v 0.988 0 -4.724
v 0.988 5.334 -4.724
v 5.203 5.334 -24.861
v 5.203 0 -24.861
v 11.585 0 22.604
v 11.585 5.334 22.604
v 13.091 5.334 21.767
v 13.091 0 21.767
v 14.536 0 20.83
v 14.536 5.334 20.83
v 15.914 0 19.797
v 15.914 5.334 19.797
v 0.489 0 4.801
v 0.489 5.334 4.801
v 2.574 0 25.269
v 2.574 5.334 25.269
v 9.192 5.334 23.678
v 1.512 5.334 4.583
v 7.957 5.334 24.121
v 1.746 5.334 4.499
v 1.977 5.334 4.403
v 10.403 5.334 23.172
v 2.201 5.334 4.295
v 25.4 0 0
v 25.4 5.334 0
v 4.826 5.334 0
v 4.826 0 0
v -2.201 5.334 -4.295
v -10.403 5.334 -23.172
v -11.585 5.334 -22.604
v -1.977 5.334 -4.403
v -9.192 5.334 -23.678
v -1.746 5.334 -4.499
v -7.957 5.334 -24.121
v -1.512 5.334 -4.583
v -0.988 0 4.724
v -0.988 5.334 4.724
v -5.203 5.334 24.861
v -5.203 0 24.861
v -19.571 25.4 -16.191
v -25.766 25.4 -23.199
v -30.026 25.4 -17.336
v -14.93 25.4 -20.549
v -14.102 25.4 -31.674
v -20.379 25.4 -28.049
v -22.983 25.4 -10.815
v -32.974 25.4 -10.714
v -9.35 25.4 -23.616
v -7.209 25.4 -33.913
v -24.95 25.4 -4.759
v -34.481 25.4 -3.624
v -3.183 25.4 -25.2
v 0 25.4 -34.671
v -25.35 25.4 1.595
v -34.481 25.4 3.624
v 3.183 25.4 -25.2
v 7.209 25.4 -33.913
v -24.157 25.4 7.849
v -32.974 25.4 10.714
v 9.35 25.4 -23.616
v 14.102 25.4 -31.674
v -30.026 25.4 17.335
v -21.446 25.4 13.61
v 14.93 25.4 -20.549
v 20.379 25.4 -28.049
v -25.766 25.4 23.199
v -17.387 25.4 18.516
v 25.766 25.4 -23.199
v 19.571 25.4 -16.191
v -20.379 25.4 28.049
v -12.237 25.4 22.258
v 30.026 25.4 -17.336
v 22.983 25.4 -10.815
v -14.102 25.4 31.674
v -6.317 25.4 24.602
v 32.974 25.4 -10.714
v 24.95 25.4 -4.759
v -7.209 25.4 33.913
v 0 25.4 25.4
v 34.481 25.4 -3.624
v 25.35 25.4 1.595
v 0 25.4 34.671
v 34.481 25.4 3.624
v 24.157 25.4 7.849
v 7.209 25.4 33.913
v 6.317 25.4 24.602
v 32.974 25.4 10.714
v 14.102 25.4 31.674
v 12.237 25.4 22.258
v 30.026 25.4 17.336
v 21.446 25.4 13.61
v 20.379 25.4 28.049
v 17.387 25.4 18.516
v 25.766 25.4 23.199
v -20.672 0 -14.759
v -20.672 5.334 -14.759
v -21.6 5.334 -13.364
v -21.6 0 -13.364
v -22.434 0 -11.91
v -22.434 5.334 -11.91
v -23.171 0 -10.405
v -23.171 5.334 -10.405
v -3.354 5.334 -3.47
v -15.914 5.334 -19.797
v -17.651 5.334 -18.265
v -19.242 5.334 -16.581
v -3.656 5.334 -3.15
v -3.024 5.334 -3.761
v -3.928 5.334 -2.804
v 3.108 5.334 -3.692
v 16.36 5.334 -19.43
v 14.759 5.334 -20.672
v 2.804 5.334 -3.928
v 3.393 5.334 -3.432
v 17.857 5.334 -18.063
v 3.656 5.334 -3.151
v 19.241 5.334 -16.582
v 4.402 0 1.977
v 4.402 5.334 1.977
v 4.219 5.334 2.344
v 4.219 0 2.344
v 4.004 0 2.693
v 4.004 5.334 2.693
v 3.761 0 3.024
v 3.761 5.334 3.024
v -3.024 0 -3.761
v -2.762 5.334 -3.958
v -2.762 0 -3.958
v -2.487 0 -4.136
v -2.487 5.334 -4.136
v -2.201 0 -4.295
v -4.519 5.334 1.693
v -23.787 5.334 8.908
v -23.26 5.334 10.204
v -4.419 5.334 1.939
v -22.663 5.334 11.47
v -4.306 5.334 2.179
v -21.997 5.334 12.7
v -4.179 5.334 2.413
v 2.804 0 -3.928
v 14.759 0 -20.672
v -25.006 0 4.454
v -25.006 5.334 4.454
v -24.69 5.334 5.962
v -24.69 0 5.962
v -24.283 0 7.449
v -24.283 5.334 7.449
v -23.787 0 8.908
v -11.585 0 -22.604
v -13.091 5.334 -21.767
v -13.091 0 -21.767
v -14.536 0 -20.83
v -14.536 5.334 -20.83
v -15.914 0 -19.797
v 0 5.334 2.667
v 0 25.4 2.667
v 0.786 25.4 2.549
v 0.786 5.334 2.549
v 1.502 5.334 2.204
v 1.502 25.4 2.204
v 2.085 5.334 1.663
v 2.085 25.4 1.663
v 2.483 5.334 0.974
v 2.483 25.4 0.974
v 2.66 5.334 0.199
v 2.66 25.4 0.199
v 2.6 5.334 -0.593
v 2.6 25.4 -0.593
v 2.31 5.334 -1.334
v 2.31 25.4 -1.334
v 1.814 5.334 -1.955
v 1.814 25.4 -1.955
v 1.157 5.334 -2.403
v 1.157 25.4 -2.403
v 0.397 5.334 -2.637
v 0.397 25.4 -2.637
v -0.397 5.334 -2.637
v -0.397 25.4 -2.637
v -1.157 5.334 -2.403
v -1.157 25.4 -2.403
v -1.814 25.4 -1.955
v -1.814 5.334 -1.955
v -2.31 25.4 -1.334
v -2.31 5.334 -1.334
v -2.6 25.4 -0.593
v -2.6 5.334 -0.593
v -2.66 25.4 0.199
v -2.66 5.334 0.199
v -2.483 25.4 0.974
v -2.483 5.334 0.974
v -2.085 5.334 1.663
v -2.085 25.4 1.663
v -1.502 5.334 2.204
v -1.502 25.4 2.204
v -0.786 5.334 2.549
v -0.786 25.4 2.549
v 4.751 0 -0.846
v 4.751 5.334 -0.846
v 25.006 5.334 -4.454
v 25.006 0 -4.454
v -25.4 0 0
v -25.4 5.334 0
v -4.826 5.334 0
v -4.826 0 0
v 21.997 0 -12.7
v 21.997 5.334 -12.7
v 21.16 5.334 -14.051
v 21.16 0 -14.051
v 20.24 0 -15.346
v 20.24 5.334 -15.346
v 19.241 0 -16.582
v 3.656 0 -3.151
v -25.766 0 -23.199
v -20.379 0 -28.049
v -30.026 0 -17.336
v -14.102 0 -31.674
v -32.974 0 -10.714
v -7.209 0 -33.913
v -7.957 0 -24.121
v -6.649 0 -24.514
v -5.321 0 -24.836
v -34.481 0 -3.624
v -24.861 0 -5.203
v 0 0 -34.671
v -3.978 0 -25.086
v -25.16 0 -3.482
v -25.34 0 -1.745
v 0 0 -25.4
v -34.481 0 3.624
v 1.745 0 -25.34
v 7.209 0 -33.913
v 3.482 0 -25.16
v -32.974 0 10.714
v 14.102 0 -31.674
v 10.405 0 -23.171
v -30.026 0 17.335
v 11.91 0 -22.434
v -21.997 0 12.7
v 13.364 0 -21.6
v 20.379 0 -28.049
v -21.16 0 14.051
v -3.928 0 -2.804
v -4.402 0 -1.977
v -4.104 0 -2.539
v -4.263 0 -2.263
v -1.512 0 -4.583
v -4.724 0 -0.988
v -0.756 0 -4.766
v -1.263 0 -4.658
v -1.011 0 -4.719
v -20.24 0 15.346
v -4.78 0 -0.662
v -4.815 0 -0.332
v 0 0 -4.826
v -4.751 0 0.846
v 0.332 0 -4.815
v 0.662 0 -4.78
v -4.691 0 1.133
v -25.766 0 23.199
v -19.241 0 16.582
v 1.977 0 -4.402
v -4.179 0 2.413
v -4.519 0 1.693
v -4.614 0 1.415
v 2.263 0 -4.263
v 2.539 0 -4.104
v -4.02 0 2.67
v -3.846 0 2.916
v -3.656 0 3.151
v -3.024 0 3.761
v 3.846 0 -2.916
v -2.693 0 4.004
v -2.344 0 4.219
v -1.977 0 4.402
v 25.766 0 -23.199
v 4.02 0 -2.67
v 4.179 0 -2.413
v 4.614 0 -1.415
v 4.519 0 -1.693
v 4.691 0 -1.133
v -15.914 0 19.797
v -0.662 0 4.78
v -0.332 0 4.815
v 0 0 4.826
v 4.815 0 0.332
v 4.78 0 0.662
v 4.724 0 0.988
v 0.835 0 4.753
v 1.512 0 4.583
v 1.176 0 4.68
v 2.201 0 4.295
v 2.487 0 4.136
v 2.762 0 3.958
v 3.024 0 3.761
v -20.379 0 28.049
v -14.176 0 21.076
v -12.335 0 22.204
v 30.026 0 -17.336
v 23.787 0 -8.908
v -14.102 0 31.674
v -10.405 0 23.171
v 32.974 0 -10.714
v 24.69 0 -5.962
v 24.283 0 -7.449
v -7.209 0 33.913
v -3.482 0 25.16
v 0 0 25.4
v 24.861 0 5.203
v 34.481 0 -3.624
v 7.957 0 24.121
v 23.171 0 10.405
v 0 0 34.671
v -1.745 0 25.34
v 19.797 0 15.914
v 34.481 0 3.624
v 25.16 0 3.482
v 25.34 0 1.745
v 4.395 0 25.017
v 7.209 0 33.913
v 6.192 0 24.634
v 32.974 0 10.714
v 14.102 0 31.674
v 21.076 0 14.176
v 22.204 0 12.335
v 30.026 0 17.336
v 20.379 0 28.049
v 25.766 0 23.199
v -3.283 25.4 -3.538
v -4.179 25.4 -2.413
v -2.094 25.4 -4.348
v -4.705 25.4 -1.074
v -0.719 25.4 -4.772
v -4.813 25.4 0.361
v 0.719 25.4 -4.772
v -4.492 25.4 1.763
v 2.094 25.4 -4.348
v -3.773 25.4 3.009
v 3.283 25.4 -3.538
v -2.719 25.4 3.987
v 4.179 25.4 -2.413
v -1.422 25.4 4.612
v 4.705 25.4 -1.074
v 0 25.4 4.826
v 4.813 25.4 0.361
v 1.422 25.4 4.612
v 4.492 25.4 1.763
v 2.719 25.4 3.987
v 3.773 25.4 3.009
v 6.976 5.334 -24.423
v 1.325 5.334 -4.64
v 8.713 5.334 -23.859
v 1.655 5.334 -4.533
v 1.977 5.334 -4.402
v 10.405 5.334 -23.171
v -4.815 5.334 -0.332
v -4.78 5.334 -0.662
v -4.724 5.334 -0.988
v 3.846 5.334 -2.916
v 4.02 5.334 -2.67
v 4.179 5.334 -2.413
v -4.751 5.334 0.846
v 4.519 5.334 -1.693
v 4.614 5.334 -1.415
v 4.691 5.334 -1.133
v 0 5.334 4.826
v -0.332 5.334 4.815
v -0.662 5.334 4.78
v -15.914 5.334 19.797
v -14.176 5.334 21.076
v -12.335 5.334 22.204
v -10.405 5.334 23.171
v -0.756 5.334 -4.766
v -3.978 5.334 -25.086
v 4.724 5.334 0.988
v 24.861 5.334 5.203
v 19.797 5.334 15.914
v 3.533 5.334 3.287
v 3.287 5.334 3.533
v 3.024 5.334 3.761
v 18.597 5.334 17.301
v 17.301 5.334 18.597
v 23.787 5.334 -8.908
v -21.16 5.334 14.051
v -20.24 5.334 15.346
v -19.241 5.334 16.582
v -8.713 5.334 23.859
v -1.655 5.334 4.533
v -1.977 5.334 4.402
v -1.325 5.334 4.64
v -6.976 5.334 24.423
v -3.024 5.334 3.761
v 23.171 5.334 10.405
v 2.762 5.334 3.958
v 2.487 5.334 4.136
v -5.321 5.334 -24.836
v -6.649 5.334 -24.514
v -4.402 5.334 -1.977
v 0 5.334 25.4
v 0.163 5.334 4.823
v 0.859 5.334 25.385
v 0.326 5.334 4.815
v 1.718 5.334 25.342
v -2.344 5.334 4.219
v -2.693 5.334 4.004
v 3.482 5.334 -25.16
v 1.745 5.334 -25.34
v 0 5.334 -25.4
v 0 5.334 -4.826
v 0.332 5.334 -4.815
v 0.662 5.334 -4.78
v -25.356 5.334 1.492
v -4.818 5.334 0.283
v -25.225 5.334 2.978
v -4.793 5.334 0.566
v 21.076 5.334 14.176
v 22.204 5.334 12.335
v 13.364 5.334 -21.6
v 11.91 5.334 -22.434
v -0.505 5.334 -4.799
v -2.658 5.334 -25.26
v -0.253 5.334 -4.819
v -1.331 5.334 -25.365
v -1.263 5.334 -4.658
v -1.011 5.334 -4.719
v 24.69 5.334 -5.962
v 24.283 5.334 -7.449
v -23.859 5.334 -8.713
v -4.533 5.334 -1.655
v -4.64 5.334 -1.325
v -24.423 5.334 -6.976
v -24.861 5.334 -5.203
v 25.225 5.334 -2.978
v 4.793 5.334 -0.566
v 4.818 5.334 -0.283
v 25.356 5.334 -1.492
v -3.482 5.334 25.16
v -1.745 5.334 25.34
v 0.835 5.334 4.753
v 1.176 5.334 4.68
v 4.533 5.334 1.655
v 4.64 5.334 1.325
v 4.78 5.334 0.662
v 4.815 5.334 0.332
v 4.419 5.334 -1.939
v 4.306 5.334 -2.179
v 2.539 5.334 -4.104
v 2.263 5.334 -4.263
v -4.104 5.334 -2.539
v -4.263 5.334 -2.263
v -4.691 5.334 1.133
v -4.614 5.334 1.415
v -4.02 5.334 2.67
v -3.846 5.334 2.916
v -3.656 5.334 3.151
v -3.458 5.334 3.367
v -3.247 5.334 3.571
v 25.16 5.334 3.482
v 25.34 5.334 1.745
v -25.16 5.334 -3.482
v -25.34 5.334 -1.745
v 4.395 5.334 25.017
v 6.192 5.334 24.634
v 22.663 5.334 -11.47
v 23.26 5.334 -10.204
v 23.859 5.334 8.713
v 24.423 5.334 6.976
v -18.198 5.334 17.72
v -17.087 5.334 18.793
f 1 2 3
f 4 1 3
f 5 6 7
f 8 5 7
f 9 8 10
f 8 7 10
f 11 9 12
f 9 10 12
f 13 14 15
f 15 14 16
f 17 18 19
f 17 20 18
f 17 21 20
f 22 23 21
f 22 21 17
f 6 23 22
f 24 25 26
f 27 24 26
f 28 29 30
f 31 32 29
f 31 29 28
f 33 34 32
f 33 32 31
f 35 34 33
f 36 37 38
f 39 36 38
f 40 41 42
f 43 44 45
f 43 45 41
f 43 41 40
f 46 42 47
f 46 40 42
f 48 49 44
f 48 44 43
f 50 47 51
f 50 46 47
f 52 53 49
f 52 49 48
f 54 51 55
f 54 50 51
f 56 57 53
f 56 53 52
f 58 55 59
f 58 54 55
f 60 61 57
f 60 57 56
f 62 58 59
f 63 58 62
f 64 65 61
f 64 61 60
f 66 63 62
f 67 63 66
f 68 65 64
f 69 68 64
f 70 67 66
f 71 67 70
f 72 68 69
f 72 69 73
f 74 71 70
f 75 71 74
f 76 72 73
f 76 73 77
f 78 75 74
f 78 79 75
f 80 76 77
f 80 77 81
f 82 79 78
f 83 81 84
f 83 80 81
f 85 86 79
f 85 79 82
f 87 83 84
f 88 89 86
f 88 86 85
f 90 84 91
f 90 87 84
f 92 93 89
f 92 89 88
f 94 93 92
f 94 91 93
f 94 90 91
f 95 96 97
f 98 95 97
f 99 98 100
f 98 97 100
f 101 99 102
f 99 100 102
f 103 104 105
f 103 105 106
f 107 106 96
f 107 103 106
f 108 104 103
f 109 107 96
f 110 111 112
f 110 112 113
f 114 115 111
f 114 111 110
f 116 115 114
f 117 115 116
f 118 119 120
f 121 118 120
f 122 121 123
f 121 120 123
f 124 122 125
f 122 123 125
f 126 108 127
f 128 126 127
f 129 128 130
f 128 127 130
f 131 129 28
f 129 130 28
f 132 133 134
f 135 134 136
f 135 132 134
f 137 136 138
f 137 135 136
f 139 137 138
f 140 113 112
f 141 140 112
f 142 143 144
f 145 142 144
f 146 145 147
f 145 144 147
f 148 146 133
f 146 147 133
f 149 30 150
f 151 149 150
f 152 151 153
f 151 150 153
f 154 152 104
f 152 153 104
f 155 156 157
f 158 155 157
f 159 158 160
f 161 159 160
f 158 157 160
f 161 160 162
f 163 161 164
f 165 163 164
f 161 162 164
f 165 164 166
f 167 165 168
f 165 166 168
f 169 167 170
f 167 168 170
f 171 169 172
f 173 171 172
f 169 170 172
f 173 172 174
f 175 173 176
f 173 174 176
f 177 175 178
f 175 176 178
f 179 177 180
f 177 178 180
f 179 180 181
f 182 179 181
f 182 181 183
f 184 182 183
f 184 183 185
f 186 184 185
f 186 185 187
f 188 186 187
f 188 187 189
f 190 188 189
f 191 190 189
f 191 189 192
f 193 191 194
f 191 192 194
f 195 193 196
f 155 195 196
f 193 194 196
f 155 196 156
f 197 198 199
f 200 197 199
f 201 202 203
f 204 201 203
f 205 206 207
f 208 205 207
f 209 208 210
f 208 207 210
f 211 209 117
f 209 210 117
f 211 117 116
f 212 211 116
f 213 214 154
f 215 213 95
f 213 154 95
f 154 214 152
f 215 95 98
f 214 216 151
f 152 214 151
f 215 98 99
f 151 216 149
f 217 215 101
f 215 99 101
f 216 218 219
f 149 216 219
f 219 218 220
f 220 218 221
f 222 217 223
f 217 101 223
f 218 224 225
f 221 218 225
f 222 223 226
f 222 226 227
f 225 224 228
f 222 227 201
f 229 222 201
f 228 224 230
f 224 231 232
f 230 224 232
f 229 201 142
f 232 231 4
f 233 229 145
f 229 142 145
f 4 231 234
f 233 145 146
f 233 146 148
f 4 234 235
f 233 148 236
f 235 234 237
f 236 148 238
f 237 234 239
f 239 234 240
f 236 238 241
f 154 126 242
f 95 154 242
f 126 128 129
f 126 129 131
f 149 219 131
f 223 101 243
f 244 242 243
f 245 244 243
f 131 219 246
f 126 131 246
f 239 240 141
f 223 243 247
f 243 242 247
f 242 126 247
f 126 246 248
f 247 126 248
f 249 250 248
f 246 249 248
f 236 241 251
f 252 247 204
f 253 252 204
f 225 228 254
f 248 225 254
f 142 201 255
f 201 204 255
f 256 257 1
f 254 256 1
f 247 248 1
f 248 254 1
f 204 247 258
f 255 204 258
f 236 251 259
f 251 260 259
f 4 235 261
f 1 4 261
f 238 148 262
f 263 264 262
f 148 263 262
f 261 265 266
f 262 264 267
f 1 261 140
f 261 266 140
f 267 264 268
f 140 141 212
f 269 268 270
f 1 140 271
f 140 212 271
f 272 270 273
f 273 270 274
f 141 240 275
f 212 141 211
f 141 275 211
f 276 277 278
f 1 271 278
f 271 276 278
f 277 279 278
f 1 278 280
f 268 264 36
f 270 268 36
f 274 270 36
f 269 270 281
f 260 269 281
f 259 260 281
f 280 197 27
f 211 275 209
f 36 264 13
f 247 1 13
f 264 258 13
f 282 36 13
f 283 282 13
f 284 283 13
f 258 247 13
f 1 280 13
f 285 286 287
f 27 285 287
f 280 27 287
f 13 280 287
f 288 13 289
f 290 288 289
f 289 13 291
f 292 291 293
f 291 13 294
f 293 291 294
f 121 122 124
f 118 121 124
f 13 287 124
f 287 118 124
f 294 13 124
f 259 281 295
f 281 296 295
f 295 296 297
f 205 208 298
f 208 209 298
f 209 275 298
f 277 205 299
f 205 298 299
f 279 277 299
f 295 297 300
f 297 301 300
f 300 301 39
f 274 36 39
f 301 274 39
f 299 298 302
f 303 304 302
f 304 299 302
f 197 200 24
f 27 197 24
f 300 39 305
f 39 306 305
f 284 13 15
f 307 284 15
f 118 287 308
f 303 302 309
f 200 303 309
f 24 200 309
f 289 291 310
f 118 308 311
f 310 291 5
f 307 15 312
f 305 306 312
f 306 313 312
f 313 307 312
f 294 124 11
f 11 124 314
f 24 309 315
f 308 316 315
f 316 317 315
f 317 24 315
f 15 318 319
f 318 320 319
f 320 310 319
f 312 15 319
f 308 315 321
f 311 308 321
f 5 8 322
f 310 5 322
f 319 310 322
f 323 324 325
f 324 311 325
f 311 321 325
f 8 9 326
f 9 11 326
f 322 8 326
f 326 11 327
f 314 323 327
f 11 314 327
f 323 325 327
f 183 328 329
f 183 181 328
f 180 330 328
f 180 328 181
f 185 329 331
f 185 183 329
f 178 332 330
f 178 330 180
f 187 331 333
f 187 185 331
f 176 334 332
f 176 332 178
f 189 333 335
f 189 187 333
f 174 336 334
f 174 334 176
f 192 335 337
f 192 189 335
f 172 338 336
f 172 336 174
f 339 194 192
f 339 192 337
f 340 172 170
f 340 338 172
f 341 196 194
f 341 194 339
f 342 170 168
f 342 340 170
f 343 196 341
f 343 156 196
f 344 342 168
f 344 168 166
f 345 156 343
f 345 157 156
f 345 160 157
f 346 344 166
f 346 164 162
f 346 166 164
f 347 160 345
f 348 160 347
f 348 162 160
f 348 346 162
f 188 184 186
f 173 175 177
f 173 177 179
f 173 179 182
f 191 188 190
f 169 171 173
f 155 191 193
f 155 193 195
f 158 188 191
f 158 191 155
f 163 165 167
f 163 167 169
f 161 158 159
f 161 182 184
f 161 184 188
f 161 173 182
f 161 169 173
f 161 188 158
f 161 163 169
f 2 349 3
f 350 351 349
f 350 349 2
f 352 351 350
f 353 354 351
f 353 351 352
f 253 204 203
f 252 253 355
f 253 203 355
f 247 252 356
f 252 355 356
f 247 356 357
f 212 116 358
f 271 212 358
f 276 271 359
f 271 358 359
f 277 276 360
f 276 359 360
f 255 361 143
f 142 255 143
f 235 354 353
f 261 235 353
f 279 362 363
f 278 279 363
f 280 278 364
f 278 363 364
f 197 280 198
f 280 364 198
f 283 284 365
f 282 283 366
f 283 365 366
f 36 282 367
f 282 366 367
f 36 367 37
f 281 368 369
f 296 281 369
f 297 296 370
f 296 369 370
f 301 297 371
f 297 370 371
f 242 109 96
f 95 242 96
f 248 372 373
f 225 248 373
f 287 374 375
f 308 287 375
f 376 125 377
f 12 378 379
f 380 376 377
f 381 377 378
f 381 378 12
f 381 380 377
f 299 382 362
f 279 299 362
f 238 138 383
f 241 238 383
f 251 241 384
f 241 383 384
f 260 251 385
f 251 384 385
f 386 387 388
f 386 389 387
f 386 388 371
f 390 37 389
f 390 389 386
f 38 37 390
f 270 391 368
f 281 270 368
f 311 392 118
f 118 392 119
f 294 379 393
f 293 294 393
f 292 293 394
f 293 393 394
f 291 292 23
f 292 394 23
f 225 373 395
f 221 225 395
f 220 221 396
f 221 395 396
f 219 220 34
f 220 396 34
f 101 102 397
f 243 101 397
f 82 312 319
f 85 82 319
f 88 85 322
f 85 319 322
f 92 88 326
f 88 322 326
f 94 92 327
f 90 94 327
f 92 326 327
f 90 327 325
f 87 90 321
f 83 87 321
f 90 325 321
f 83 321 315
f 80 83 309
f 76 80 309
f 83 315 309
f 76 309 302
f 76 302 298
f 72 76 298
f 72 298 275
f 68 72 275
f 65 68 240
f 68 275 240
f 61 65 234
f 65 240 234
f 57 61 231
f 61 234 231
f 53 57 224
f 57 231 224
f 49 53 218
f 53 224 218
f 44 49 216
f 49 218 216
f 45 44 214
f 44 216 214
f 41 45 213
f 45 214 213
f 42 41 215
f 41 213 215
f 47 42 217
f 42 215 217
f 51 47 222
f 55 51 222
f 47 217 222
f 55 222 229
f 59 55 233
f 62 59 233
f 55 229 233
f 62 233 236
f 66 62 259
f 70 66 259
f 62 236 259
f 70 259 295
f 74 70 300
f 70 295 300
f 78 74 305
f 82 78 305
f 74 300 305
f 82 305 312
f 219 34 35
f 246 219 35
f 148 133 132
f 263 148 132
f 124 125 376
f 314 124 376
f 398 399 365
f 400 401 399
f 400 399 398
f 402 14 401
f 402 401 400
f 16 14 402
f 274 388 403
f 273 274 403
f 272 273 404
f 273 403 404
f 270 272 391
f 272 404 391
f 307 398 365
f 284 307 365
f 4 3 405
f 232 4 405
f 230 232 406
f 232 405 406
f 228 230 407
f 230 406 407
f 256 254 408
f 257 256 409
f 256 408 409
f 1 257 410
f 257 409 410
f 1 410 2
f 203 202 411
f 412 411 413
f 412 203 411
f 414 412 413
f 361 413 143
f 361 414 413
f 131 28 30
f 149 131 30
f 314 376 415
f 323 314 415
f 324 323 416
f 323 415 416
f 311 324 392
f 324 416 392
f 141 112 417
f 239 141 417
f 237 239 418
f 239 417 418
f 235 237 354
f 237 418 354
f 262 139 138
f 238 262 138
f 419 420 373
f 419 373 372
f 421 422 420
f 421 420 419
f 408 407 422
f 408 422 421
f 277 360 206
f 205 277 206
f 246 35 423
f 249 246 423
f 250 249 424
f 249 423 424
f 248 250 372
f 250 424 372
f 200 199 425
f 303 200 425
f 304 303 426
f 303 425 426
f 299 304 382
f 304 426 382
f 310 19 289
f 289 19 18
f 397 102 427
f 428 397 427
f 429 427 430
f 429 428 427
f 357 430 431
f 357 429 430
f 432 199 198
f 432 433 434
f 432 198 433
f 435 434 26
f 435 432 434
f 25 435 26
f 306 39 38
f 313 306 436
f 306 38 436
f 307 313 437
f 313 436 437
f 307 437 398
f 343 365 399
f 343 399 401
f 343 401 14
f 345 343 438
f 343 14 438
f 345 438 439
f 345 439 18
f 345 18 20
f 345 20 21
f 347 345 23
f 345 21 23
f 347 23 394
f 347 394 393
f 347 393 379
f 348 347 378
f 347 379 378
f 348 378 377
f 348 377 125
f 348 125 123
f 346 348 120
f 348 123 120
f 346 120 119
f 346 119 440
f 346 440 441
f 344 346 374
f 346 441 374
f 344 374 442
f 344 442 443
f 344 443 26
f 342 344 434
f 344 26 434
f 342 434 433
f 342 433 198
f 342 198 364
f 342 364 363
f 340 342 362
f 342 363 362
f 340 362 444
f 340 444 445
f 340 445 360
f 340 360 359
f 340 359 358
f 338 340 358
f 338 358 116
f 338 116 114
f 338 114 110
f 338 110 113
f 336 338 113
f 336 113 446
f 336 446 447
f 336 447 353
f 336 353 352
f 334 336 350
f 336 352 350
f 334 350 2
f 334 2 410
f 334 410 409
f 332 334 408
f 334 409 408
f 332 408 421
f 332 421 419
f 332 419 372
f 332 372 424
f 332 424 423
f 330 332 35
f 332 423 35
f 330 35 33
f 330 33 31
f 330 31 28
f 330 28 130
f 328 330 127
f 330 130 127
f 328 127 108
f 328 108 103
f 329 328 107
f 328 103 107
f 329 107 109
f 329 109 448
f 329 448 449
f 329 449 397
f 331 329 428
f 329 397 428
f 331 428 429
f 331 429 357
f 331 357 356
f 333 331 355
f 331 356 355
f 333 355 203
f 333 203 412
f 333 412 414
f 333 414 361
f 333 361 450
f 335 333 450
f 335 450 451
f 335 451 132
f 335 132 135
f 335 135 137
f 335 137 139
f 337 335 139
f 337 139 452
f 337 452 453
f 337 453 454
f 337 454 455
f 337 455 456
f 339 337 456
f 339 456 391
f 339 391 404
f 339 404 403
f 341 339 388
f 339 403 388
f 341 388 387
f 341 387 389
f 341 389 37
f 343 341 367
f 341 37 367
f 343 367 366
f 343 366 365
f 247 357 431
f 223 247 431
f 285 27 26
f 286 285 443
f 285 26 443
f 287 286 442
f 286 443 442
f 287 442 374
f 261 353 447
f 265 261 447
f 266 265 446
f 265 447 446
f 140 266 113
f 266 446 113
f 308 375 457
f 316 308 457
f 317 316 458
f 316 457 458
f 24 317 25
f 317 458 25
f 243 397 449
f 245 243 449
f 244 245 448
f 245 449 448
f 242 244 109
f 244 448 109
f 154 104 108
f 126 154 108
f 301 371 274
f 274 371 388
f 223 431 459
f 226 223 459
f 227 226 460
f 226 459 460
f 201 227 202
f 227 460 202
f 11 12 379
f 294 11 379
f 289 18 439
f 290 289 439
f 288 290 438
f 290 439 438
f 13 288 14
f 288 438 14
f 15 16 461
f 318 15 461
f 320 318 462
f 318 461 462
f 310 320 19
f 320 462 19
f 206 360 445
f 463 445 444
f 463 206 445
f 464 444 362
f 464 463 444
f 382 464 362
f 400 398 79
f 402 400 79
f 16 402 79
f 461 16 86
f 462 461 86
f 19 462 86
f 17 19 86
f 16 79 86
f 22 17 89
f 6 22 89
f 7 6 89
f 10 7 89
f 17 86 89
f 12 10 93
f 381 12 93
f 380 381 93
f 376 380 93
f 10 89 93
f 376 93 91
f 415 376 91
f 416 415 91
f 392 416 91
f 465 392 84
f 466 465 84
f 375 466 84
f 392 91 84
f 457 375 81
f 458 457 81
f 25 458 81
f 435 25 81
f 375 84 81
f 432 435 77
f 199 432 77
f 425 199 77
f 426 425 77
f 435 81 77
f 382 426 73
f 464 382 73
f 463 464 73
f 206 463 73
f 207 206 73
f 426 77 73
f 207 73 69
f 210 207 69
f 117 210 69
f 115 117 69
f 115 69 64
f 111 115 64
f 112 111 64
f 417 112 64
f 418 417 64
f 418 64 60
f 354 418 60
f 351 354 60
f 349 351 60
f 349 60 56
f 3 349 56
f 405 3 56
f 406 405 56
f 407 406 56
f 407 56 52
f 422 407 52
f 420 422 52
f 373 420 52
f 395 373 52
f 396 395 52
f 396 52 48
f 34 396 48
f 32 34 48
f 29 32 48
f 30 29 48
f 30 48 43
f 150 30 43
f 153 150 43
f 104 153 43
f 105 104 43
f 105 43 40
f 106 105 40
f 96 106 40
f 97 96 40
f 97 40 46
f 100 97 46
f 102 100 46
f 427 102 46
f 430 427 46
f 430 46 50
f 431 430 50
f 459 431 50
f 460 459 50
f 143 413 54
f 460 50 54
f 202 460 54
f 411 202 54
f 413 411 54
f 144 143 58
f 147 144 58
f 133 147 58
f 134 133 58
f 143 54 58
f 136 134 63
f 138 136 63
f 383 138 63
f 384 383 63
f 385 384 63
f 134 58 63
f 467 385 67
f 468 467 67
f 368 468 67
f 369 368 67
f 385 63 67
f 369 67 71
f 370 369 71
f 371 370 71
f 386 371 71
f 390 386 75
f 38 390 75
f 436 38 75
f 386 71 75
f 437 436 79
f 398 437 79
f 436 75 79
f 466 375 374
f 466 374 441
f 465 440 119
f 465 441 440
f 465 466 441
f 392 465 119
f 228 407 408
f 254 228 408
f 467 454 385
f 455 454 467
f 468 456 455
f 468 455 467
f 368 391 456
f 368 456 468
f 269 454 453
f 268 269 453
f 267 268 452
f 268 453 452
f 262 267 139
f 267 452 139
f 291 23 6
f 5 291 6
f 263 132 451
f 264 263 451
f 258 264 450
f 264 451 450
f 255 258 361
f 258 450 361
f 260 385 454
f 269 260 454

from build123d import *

# Parameters (mm, degrees)
SKETCH1_R           = 34.671
BOSS_EXTRUDE1_DEPTH = 25.4
SKETCH2_R           = 25.4
CUT_EXTRUDE1_DEPTH  = 20.066
SKETCH4_R           = 4.826
BOSS_EXTRUDE2_DEPTH = 20.066
SKETCH5_R           = 2.667
CUT_EXTRUDE2_DEPTH  = 20.066
CUT_EXTRUDE3_DEPTH  = 53.979249126


with BuildPart() as part:
    # Sketch1 → Boss-Extrude1 (new body)
    with BuildSketch(Plane(origin=(0, 0, 0), x_dir=(1, 0, 0), z_dir=(0, 1, 0))):
        with Locations(Location((0, 0, 0), (0, 0, 270))):
            Circle(SKETCH1_R)
    extrude(amount=BOSS_EXTRUDE1_DEPTH)

    # Sketch2 → Cut-Extrude1 (cut)
    with BuildSketch(Plane(origin=(0, 25.4, 0), x_dir=(1, 0, 0), z_dir=(0, 1, 0))):
        with Locations(Location((0, 0, 0), (0, 0, 270))):
            Circle(SKETCH2_R)
    extrude(amount=-CUT_EXTRUDE1_DEPTH, mode=Mode.SUBTRACT)

    # Sketch4 → Boss-Extrude2 (add)
    with BuildSketch(Plane(origin=(0, 5.334, 0), x_dir=(1, 0, 0), z_dir=(0, 1, 0))):
        with Locations(Location((0, 0, 0), (0, 0, 270))):
            Circle(SKETCH4_R)
    extrude(amount=BOSS_EXTRUDE2_DEPTH)

    # Sketch5 → Cut-Extrude2 (cut)
    with BuildSketch(Plane(origin=(0, 25.4, 0), x_dir=(1, 0, 0), z_dir=(0, 1, 0))):
        with Locations(Location((0, 0, 0), (0, 0, 270))):
            Circle(SKETCH5_R)
    extrude(amount=-CUT_EXTRUDE2_DEPTH, mode=Mode.SUBTRACT)

    # Sketch6 → Cut-Extrude3 (cut, through all)
    with BuildSketch(Plane(origin=(0, 5.334, 0), x_dir=(1, 0, 0), z_dir=(0, 1, 0))):
        with BuildLine():
            ThreePointArc((-20.672131698, 14.758826886), (-22.029333921, 12.643909483), (-23.170911404, 10.405232564))
            Line((-23.170911404, 10.405232564), (-4.402473167, 1.976994187))
            ThreePointArc((-4.402473167, 1.976994187), (-4.185573445, 2.402342802), (-3.927705023, 2.804177108))
            Line((-3.927705023, 2.804177108), (-20.672131698, 14.758826886))
        make_face()
        with BuildLine():
            Line((-15.913974648, 19.796600993), (-3.023655183, 3.761354189))
            ThreePointArc((-3.023655183, 3.761354189), (-2.626023591, 4.048984577), (-2.201236583, 4.294744871))
            Line((-2.201236583, 4.294744871), (-11.585455702, 22.603920372))
            ThreePointArc((-11.585455702, 22.603920372), (-13.821176792, 21.31044514), (-15.913974648, 19.796600993))
        make_face()
        with BuildLine():
            Line((-7.956987324, 24.121491511), (-1.511827592, 4.583083387))
            ThreePointArc((-1.511827592, 4.583083387), (-1.13757061, 4.690011632), (-0.755913796, 4.766431614))
            Line((-0.755913796, 4.766431614), (-3.978493662, 25.08648218))
            ThreePointArc((-3.978493662, 25.08648218), (-5.987213738, 24.684271747), (-7.956987324, 24.121491511))
        make_face()
        with BuildLine():
            Line((0, 25.4), (0, 4.826))
            ThreePointArc((0, 4.826), (0.496889313, 4.800351759), (0.988497094, 4.723679656))
            Line((0.988497094, 4.723679656), (5.202616282, 24.861471876))
            ThreePointArc((5.202616282, 24.861471876), (2.61520691, 25.265009258), (0, 25.4))
        make_face()
        with BuildLine():
            Line((10.405232564, 23.170911404), (1.976994187, 4.402473167))
            ThreePointArc((1.976994187, 4.402473167), (2.402342802, 4.185573445), (2.804177108, 3.927705023))
            Line((2.804177108, 3.927705023), (14.758826886, 20.672131698))
            ThreePointArc((14.758826886, 20.672131698), (12.643909483, 22.029333921), (10.405232564, 23.170911404))
        make_face()
        with BuildLine():
            Line((19.240686042, 16.581797268), (3.655730348, 3.150541481))
            ThreePointArc((3.655730348, 3.150541481), (3.93490279, 2.794068008), (4.179438599, 2.413))
            Line((4.179438599, 2.413), (21.997045256, 12.7))
            ThreePointArc((21.997045256, 12.7), (20.710014683, 14.705621097), (19.240686042, 16.581797268))
        make_face()
        with BuildLine():
            Line((23.786716405, 8.90798084), (4.519476117, 1.69251636))
            ThreePointArc((4.519476117, 1.69251636), (4.654621925, 1.274664949), (4.751223326, 0.84625818))
            Line((4.751223326, 0.84625818), (25.006438558, 4.45399042))
            ThreePointArc((25.006438558, 4.45399042), (24.498010133, 6.708762891), (23.786716405, 8.90798084))
        make_face()
        with BuildLine():
            Line((25.4, 0), (4.826, 0))
            ThreePointArc((4.826, 0), (4.800351759, -0.496889313), (4.723679656, -0.988497094))
            Line((4.723679656, -0.988497094), (24.861471876, -5.202616282))
            ThreePointArc((24.861471876, -5.202616282), (25.265009258, -2.61520691), (25.4, 0))
        make_face()
        with BuildLine():
            Line((23.170911404, -10.405232564), (4.402473167, -1.976994187))
            ThreePointArc((4.402473167, -1.976994187), (4.115324299, -2.520789939), (3.761354189, -3.023655183))
            Line((3.761354189, -3.023655183), (19.796600993, -15.913974648))
            ThreePointArc((19.796600993, -15.913974648), (21.659601572, -13.267315469), (23.170911404, -10.405232564))
        make_face()
        with BuildLine():
            Line((15.913974648, -19.796600993), (3.023655183, -3.761354189))
            ThreePointArc((3.023655183, -3.761354189), (2.626023591, -4.048984577), (2.201236583, -4.294744871))
            Line((2.201236583, -4.294744871), (11.585455702, -22.603920372))
            ThreePointArc((11.585455702, -22.603920372), (13.821176792, -21.31044514), (15.913974648, -19.796600993))
        make_face()
        with BuildLine():
            Line((7.956987324, -24.121491511), (1.511827592, -4.583083387))
            ThreePointArc((1.511827592, -4.583083387), (1.00639234, -4.719899412), (0.489109394, -4.801150695))
            Line((0.489109394, -4.801150695), (2.574259969, -25.269214187))
            ThreePointArc((2.574259969, -25.269214187), (5.296801792, -24.841575851), (7.956987324, -24.121491511))
        make_face()
        with BuildLine():
            Line((0, -25.4), (0, -4.826))
            ThreePointArc((0, -4.826), (-0.496889313, -4.800351759), (-0.988497094, -4.723679656))
            Line((-0.988497094, -4.723679656), (-5.202616282, -24.861471876))
            ThreePointArc((-5.202616282, -24.861471876), (-2.61520691, -25.265009258), (0, -25.4))
        make_face()
        with BuildLine():
            Line((-10.405232564, -23.170911404), (-1.976994187, -4.402473167))
            ThreePointArc((-1.976994187, -4.402473167), (-2.520789939, -4.115324299), (-3.023655183, -3.761354189))
            Line((-3.023655183, -3.761354189), (-15.913974648, -19.796600993))
            ThreePointArc((-15.913974648, -19.796600993), (-13.267315469, -21.659601572), (-10.405232564, -23.170911404))
        make_face()
        with BuildLine():
            Line((-19.240686042, -16.581797268), (-3.655730348, -3.150541481))
            ThreePointArc((-3.655730348, -3.150541481), (-3.93490279, -2.794068008), (-4.179438599, -2.413))
            Line((-4.179438599, -2.413), (-21.997045256, -12.7))
            ThreePointArc((-21.997045256, -12.7), (-20.710014683, -14.705621097), (-19.240686042, -16.581797268))
        make_face()
        with BuildLine():
            Line((-4.751223326, -0.84625818), (-25.006438558, -4.45399042))
            ThreePointArc((-25.006438558, -4.45399042), (-24.498010133, -6.708762891), (-23.786716405, -8.90798084))
            Line((-23.786716405, -8.90798084), (-4.519476117, -1.69251636))
            ThreePointArc((-4.519476117, -1.69251636), (-4.654621925, -1.274664949), (-4.751223326, -0.84625818))
        make_face()
        with BuildLine():
            ThreePointArc((-24.861471876, 5.202616282), (-25.265009258, 2.61520691), (-25.4, 0))
            Line((-25.4, 0), (-4.826, 0))
            ThreePointArc((-4.826, 0), (-4.800351759, 0.496889313), (-4.723679656, 0.988497094))
            Line((-4.723679656, 0.988497094), (-24.861471876, 5.202616282))
        make_face()
    extrude(amount=-CUT_EXTRUDE3_DEPTH, mode=Mode.SUBTRACT)


solid = part.part
